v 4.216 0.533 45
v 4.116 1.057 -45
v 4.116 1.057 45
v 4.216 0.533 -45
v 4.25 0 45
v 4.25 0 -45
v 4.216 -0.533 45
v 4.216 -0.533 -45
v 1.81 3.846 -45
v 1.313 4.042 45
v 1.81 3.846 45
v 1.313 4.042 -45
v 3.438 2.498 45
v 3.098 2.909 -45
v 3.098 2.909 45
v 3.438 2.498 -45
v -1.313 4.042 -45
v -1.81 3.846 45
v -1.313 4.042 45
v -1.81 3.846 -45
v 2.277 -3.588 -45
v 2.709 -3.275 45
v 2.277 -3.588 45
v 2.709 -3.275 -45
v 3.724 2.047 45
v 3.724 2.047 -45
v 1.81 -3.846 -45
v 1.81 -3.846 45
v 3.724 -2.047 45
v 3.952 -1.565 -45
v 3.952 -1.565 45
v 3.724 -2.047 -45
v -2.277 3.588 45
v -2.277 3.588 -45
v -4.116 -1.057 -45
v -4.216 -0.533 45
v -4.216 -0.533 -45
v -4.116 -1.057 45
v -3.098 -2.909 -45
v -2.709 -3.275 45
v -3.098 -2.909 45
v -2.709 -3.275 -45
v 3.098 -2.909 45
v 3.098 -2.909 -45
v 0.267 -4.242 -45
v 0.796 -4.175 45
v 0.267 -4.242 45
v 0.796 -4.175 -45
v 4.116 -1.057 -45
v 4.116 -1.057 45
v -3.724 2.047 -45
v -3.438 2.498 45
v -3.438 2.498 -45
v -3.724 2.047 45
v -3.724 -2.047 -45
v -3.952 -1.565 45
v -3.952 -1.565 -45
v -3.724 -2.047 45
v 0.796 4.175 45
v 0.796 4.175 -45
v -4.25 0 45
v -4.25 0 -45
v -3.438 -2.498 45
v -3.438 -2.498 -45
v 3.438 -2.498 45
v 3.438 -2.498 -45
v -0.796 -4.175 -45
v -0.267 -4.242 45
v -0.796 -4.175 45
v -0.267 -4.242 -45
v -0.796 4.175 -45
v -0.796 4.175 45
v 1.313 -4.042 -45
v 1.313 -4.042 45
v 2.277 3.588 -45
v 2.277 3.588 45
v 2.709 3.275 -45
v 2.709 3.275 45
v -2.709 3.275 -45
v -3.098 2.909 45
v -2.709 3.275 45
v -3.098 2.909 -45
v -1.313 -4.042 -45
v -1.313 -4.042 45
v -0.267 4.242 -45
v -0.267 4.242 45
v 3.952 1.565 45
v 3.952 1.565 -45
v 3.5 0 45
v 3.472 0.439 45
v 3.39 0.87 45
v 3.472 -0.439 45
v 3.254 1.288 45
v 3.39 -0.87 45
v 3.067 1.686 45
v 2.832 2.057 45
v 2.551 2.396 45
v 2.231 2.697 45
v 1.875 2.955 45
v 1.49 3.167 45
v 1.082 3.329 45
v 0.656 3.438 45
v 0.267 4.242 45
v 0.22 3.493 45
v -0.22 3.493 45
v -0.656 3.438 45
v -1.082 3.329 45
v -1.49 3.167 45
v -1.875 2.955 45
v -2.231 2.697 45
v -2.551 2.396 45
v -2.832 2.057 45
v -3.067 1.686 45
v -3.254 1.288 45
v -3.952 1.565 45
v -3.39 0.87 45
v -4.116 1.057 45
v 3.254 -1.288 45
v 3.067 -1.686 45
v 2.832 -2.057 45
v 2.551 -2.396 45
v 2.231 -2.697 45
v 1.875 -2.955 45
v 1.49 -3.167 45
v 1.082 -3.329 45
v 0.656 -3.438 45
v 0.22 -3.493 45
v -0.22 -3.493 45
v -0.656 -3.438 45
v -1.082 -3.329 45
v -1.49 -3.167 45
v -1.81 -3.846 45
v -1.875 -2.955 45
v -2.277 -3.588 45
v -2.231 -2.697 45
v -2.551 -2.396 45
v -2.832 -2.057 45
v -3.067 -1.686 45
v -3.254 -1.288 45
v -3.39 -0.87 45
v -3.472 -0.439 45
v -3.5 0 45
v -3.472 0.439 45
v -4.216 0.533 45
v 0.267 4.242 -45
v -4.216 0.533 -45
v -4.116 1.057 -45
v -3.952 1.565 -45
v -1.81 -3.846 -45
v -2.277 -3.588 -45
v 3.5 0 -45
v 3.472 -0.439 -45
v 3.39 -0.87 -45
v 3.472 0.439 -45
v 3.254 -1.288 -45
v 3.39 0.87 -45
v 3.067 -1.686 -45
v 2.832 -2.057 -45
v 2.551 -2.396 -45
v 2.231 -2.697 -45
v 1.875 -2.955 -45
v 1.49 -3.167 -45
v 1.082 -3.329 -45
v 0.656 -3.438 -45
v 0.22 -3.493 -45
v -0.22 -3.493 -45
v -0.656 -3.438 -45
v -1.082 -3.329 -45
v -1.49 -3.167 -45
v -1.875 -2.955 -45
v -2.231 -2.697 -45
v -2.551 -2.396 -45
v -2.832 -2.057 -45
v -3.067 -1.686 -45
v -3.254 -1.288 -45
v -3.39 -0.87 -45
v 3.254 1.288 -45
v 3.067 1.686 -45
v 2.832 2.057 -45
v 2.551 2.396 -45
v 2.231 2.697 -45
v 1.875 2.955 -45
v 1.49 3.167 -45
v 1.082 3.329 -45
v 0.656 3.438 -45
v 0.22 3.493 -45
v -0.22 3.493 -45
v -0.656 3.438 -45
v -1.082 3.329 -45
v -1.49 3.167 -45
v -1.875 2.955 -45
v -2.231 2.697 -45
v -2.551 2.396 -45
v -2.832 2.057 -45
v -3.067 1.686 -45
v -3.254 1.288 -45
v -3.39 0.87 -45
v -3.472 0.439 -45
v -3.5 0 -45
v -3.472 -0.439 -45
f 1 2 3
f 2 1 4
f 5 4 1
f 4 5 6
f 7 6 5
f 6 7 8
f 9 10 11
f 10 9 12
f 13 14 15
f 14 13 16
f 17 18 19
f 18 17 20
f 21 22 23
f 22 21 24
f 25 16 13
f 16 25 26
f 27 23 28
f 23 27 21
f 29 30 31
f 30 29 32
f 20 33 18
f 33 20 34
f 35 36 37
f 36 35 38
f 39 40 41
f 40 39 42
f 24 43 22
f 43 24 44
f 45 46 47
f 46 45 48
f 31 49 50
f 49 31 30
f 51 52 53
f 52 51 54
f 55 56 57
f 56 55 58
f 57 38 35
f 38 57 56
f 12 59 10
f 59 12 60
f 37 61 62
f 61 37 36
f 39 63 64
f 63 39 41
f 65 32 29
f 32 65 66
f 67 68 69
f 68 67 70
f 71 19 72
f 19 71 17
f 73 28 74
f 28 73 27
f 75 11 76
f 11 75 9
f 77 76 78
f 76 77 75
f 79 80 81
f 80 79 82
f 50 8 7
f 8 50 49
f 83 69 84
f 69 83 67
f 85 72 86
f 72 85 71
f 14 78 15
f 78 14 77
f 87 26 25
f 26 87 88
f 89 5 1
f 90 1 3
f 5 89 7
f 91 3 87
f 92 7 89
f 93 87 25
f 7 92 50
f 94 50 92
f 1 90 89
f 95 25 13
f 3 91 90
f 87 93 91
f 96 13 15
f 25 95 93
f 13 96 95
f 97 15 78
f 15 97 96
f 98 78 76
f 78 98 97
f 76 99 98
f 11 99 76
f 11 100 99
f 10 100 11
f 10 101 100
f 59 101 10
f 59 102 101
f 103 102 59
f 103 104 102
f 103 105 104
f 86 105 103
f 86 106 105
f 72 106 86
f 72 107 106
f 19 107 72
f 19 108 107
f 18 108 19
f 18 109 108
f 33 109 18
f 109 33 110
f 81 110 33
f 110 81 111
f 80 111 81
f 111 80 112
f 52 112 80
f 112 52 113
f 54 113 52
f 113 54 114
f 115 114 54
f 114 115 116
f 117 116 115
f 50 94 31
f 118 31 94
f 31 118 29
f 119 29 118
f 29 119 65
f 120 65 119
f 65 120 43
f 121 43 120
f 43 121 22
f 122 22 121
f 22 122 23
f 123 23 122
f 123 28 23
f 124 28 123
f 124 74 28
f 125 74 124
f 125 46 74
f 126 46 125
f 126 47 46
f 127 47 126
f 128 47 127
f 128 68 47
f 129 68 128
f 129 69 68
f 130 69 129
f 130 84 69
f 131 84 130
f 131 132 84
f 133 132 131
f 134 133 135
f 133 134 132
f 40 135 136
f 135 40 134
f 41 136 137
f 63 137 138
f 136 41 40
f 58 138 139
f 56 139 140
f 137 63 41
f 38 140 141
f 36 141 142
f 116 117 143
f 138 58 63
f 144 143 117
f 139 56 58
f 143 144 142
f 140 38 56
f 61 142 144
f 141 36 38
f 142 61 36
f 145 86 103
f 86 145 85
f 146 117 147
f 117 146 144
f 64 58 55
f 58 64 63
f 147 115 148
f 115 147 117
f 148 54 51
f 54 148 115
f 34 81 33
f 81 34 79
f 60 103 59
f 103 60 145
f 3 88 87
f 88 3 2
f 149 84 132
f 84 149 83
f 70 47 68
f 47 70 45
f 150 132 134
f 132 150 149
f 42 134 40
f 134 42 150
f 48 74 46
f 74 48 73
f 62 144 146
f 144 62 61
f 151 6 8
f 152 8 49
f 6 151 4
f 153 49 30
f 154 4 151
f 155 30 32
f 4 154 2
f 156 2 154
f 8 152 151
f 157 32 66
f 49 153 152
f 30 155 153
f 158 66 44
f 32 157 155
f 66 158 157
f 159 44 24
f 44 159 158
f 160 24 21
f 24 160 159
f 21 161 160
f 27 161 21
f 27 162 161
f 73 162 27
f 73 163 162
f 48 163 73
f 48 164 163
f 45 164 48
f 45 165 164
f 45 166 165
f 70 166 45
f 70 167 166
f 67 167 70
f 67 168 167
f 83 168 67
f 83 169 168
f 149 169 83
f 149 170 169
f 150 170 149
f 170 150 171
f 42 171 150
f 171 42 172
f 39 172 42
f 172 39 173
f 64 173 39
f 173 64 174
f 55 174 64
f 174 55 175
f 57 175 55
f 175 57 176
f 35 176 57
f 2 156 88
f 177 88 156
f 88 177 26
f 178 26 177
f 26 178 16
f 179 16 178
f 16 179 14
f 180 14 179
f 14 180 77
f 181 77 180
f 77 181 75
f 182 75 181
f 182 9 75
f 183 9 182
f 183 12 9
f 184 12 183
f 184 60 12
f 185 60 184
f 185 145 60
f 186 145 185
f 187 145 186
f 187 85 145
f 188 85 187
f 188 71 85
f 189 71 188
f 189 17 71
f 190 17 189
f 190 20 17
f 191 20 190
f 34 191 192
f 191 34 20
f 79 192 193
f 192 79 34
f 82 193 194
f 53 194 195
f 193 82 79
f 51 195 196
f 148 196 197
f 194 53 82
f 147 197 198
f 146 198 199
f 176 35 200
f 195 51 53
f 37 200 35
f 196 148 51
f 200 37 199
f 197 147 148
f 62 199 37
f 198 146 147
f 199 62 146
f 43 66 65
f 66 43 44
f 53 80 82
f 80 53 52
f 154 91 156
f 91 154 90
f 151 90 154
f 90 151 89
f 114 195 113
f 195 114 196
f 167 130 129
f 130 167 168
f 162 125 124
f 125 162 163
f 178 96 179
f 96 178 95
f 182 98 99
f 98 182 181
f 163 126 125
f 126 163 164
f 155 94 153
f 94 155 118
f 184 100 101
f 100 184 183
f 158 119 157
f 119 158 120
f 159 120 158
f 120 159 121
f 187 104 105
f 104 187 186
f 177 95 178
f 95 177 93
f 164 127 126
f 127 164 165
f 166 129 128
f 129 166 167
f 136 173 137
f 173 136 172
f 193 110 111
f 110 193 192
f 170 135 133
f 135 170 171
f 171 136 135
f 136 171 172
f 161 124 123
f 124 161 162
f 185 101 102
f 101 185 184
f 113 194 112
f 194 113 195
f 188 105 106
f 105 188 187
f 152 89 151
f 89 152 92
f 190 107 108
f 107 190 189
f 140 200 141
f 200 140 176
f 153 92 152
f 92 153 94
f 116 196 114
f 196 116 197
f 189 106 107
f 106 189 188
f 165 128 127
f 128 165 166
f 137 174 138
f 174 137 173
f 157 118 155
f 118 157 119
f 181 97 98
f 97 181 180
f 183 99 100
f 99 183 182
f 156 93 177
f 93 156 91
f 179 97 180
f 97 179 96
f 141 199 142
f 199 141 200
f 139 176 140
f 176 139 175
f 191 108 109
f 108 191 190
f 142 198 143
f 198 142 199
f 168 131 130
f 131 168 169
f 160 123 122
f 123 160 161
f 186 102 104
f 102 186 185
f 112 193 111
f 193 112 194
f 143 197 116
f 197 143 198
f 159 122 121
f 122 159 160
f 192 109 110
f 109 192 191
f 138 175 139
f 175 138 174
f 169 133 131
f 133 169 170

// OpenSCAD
$fn = 50;


difference() {
	union() {
		translate(v = [0, 0, -45.0000000000]) {
			cylinder(h = 90, r = 4.2500000000);
		}
	}
	union() {
		translate(v = [0, 0, -100.0000000000]) {
			cylinder(h = 200, r = 3.5000000000);
		}
	}
}
